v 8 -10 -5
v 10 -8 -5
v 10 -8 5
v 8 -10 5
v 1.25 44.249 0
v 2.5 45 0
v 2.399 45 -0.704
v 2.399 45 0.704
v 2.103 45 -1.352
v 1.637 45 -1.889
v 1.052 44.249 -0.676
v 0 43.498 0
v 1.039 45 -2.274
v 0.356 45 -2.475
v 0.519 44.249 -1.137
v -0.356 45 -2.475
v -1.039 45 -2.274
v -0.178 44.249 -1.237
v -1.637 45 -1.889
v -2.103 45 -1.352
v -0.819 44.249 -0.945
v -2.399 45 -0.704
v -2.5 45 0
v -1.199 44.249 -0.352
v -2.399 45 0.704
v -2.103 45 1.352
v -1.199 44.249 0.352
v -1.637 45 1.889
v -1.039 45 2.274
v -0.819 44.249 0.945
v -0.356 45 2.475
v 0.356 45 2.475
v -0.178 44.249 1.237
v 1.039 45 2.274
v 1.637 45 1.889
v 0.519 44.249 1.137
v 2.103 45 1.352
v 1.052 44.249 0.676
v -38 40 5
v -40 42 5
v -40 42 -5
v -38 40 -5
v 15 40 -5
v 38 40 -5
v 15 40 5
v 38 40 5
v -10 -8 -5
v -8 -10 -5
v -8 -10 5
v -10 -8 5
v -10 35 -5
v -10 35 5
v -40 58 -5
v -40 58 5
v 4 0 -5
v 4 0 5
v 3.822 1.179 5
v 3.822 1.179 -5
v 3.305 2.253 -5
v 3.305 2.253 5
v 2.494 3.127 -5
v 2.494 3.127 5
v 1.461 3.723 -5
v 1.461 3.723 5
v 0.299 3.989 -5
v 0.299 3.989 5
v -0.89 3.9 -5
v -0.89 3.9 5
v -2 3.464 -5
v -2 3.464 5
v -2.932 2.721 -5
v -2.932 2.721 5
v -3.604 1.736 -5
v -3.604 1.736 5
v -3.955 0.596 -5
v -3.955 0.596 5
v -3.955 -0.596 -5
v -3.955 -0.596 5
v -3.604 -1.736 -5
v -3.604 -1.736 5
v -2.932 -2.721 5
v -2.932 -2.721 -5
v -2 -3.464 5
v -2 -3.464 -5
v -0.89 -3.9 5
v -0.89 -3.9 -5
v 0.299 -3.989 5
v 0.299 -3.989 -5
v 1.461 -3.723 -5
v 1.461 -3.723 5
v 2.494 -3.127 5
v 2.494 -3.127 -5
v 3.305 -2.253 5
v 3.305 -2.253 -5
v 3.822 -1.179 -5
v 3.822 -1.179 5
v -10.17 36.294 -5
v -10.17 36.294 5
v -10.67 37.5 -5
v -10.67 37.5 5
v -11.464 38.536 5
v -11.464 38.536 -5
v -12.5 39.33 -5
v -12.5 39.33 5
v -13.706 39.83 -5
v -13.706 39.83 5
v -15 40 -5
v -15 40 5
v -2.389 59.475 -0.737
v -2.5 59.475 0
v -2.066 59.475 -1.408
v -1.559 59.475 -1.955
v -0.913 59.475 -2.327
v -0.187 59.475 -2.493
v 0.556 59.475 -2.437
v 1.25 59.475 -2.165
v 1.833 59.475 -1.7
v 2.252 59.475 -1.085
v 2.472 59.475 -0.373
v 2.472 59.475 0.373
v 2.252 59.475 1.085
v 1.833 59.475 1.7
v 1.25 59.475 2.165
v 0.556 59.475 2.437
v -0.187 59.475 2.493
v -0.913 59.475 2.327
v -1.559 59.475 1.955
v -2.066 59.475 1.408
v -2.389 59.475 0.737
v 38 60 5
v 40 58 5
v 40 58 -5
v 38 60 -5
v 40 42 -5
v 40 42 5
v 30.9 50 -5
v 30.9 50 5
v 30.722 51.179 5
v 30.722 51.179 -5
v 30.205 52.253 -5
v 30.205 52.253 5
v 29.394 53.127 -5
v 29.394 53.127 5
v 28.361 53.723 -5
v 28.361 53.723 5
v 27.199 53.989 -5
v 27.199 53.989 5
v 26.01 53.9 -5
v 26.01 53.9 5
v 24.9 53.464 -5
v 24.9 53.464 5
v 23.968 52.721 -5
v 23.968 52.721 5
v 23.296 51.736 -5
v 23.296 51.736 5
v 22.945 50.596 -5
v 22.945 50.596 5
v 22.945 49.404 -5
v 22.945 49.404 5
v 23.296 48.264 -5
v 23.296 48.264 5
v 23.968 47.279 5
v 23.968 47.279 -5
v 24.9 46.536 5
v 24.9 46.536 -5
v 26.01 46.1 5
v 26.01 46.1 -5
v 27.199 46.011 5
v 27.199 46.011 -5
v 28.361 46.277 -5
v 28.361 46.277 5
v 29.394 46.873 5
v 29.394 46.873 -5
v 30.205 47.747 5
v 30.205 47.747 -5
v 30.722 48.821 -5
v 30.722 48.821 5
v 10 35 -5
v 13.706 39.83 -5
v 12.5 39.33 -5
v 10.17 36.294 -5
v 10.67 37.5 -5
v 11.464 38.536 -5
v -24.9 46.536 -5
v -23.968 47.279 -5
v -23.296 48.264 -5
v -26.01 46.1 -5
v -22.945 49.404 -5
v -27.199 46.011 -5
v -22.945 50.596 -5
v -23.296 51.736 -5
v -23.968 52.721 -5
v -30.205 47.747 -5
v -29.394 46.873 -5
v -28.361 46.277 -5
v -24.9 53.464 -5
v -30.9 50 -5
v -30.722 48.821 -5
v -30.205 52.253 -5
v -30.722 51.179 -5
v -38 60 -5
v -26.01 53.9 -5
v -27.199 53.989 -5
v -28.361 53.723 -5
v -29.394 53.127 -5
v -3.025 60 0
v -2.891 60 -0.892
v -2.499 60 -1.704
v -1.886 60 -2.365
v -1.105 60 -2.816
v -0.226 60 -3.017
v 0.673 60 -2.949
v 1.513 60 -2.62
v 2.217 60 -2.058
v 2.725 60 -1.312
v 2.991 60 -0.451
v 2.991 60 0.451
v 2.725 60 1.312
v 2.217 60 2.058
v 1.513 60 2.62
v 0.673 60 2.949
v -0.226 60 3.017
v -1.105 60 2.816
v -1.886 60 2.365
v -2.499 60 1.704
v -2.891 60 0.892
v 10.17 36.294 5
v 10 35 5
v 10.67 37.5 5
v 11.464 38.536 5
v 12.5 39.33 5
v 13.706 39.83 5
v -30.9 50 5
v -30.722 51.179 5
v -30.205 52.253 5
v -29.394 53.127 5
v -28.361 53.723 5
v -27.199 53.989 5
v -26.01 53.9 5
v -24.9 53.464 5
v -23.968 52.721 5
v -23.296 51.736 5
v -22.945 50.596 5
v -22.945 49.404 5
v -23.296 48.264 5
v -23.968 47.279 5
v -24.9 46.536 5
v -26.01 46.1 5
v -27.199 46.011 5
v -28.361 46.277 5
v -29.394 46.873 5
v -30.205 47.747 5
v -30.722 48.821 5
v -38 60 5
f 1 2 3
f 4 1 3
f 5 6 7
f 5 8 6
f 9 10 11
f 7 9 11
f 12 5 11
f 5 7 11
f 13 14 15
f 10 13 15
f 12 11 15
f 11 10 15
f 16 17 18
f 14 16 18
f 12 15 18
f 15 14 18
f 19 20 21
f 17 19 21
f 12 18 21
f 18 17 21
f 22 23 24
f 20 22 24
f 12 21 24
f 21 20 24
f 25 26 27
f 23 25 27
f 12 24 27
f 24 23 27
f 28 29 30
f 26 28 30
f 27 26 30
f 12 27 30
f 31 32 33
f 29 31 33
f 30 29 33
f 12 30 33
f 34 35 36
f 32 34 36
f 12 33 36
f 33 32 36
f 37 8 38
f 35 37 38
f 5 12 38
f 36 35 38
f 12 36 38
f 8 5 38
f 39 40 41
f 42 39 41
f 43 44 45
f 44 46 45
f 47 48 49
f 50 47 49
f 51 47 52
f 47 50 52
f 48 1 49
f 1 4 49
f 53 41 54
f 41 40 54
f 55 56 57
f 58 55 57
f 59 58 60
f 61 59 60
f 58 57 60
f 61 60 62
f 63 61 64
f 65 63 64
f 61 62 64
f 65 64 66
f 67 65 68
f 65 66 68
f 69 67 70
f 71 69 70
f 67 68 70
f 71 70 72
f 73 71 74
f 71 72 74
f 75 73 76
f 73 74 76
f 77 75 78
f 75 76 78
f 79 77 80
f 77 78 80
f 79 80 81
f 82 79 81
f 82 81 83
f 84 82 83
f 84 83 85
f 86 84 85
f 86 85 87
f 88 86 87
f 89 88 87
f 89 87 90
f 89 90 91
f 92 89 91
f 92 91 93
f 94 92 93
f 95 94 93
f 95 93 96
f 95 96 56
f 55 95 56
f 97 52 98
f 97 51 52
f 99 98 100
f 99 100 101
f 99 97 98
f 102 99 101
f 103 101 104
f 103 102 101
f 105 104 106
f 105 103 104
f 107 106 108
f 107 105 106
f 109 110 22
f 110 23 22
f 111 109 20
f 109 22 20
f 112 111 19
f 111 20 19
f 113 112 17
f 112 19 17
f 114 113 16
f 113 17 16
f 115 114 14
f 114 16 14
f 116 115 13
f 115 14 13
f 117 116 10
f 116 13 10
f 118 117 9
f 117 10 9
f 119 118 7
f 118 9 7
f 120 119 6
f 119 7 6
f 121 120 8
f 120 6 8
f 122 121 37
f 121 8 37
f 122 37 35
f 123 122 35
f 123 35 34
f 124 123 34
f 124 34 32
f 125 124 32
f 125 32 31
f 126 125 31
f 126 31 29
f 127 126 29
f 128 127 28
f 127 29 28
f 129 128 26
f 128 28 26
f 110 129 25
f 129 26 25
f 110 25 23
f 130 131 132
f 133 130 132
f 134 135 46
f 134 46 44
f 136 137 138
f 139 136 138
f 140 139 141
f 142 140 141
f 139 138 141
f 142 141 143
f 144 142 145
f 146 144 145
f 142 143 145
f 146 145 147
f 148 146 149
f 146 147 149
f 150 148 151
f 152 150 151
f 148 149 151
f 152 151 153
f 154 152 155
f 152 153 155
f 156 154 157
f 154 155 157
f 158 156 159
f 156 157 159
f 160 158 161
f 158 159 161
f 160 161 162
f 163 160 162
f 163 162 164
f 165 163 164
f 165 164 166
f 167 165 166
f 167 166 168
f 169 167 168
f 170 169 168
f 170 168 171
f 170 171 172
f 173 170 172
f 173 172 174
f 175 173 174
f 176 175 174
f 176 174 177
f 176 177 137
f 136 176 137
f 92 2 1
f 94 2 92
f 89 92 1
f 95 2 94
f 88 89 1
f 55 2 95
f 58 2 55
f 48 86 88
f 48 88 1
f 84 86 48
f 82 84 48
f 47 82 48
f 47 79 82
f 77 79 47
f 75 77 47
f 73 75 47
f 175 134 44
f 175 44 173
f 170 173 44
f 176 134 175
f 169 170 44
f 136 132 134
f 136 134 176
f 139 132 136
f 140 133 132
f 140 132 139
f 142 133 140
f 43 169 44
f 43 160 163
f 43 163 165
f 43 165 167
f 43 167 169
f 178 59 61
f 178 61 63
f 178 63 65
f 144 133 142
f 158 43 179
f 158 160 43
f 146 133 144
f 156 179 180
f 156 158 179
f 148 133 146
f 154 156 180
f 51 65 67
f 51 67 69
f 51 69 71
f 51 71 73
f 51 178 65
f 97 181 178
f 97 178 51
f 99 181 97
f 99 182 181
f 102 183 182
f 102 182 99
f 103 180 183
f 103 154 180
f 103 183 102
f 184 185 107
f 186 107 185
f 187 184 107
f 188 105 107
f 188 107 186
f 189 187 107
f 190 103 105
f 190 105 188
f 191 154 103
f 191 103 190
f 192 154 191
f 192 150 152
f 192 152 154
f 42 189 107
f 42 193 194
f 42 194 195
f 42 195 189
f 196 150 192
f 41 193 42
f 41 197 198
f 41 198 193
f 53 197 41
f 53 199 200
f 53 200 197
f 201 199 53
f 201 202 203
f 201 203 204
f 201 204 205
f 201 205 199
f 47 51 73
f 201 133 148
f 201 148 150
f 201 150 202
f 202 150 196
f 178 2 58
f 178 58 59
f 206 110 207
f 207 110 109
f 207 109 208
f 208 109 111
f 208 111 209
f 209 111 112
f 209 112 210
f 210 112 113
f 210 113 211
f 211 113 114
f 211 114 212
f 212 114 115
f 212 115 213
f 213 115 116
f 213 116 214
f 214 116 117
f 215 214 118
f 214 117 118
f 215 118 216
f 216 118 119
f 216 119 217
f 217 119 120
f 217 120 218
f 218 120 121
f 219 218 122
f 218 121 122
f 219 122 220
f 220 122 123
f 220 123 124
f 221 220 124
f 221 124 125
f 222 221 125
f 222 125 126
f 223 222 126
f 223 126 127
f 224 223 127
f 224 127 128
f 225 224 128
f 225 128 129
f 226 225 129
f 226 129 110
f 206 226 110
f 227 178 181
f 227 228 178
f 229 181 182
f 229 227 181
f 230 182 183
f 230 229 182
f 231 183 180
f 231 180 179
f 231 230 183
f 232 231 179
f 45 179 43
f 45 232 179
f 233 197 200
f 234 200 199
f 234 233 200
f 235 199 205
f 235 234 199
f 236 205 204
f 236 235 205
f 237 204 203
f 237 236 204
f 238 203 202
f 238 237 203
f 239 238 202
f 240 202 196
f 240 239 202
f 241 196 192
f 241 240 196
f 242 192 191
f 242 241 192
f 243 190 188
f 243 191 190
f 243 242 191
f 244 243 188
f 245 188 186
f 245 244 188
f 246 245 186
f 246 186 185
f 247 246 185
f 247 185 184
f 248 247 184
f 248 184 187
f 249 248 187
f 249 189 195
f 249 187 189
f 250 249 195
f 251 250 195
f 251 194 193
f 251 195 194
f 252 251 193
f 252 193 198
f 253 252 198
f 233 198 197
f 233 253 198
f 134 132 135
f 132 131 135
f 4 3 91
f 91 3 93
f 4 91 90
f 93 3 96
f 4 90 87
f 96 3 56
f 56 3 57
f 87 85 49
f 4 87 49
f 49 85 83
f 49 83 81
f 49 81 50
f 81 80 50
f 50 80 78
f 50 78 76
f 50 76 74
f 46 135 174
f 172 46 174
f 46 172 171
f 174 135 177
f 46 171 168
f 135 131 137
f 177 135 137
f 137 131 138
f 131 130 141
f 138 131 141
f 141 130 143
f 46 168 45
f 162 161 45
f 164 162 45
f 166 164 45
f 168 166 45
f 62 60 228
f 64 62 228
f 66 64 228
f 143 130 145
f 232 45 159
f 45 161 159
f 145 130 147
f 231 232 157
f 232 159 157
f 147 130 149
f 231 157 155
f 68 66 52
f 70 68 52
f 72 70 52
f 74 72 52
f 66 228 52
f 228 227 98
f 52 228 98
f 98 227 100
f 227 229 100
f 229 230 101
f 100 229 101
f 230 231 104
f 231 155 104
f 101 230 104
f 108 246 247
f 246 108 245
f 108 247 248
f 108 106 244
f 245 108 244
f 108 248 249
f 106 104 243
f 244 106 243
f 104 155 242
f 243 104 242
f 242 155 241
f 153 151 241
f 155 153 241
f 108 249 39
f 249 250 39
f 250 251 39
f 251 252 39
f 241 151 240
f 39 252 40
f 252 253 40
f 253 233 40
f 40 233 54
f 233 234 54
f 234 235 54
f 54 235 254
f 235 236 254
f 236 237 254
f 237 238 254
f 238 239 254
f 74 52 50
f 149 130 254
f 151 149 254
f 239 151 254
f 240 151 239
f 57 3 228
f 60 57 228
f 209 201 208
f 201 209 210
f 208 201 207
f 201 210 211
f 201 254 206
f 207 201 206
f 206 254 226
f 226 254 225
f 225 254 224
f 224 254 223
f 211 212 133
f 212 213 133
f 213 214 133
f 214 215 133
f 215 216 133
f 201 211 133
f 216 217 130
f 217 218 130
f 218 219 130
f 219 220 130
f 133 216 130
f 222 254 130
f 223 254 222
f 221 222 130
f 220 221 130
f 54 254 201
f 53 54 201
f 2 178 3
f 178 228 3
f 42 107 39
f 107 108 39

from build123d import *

# Parameters (mm, degrees)
PROFILE_SHAPE_DEPTH            = 5
SKETCH2_R                      = 4
LOWER_HOLE_DEPTH               = 11
SKETCH3_R                      = 4
UPPER_HOLE_RIGHT_DEPTH         = 11
M6_TAPPED_HOLE_TOP_D           = 5
M6_TAPPED_HOLE_TOP_DEPTH       = 15
M6_TAPPED_HOLE_TOP_CSINK_D     = 6.05
M6_TAPPED_HOLE_TOP_CSINK_ANGLE = 90
M6_TAPPED_HOLE_TOP_TIP         = 1.502151548
EXTERNAL_EDGES_SIZE            = 2
INTERNAL_EDGES_R               = 5


with BuildPart() as part:
    # Sketch1 → Profile Shape (new body, symmetric)
    with BuildSketch(Plane.XY):
        Polygon((-10, -10), (-10, 40), (-40, 40), (-40, 60), (40, 60), (40, 40), (10, 40), (10, -10), align=None)
    extrude(amount=PROFILE_SHAPE_DEPTH, both=True)

    # Sketch2 → Lower Hole (cut, through all)
    with BuildSketch(Plane.XY.offset(5)):
        Circle(SKETCH2_R)
    extrude(amount=-LOWER_HOLE_DEPTH, mode=Mode.SUBTRACT)

    # Sketch3 → Upper Hole Right (cut, through all)
    with BuildSketch(Plane.XY.offset(5)):
        with Locations((26.9, 50)):
            Circle(SKETCH3_R)
    upper_hole_right = extrude(amount=-UPPER_HOLE_RIGHT_DEPTH, mode=Mode.SUBTRACT)

    # Upper Hole Left: Upper Hole Right across plane
    add(upper_hole_right.mirror(Plane(origin=(0, 0, 0), x_dir=(0, 0, 1), z_dir=(1, 0, 0))), mode=Mode.SUBTRACT)

    # M6 Tapped Hole Top
    with Locations(Plane(origin=(0, 60, 0), x_dir=(1, 0, 0), z_dir=(0, 1, 0))):
        with Locations((0, 0)):
            CounterSinkHole(M6_TAPPED_HOLE_TOP_D / 2, M6_TAPPED_HOLE_TOP_CSINK_D / 2, depth=M6_TAPPED_HOLE_TOP_DEPTH, counter_sink_angle=M6_TAPPED_HOLE_TOP_CSINK_ANGLE)
            with Locations((0, 0, -(M6_TAPPED_HOLE_TOP_DEPTH + M6_TAPPED_HOLE_TOP_TIP / 2))):  # 118° drill point
                Cone(0, M6_TAPPED_HOLE_TOP_D / 2, M6_TAPPED_HOLE_TOP_TIP, mode=Mode.SUBTRACT)

    # External Edges
    external_edges_edges = [part.edges().sort_by_distance(p)[0] for p in [
        (-10, -10, 0),
        (-40, 40, 0),
        (-40, 60, 0),
        (40, 60, 0),
        (40, 40, 0),
        (10, -10, 0),
    ]]
    chamfer(external_edges_edges, length=EXTERNAL_EDGES_SIZE)

    # Internal Edges
    internal_edges_edges = [part.edges().sort_by_distance(p)[0] for p in [
        (-10, 40, 0),
        (10, 40, 0),
    ]]
    fillet(internal_edges_edges, radius=INTERNAL_EDGES_R)


solid = part.part
